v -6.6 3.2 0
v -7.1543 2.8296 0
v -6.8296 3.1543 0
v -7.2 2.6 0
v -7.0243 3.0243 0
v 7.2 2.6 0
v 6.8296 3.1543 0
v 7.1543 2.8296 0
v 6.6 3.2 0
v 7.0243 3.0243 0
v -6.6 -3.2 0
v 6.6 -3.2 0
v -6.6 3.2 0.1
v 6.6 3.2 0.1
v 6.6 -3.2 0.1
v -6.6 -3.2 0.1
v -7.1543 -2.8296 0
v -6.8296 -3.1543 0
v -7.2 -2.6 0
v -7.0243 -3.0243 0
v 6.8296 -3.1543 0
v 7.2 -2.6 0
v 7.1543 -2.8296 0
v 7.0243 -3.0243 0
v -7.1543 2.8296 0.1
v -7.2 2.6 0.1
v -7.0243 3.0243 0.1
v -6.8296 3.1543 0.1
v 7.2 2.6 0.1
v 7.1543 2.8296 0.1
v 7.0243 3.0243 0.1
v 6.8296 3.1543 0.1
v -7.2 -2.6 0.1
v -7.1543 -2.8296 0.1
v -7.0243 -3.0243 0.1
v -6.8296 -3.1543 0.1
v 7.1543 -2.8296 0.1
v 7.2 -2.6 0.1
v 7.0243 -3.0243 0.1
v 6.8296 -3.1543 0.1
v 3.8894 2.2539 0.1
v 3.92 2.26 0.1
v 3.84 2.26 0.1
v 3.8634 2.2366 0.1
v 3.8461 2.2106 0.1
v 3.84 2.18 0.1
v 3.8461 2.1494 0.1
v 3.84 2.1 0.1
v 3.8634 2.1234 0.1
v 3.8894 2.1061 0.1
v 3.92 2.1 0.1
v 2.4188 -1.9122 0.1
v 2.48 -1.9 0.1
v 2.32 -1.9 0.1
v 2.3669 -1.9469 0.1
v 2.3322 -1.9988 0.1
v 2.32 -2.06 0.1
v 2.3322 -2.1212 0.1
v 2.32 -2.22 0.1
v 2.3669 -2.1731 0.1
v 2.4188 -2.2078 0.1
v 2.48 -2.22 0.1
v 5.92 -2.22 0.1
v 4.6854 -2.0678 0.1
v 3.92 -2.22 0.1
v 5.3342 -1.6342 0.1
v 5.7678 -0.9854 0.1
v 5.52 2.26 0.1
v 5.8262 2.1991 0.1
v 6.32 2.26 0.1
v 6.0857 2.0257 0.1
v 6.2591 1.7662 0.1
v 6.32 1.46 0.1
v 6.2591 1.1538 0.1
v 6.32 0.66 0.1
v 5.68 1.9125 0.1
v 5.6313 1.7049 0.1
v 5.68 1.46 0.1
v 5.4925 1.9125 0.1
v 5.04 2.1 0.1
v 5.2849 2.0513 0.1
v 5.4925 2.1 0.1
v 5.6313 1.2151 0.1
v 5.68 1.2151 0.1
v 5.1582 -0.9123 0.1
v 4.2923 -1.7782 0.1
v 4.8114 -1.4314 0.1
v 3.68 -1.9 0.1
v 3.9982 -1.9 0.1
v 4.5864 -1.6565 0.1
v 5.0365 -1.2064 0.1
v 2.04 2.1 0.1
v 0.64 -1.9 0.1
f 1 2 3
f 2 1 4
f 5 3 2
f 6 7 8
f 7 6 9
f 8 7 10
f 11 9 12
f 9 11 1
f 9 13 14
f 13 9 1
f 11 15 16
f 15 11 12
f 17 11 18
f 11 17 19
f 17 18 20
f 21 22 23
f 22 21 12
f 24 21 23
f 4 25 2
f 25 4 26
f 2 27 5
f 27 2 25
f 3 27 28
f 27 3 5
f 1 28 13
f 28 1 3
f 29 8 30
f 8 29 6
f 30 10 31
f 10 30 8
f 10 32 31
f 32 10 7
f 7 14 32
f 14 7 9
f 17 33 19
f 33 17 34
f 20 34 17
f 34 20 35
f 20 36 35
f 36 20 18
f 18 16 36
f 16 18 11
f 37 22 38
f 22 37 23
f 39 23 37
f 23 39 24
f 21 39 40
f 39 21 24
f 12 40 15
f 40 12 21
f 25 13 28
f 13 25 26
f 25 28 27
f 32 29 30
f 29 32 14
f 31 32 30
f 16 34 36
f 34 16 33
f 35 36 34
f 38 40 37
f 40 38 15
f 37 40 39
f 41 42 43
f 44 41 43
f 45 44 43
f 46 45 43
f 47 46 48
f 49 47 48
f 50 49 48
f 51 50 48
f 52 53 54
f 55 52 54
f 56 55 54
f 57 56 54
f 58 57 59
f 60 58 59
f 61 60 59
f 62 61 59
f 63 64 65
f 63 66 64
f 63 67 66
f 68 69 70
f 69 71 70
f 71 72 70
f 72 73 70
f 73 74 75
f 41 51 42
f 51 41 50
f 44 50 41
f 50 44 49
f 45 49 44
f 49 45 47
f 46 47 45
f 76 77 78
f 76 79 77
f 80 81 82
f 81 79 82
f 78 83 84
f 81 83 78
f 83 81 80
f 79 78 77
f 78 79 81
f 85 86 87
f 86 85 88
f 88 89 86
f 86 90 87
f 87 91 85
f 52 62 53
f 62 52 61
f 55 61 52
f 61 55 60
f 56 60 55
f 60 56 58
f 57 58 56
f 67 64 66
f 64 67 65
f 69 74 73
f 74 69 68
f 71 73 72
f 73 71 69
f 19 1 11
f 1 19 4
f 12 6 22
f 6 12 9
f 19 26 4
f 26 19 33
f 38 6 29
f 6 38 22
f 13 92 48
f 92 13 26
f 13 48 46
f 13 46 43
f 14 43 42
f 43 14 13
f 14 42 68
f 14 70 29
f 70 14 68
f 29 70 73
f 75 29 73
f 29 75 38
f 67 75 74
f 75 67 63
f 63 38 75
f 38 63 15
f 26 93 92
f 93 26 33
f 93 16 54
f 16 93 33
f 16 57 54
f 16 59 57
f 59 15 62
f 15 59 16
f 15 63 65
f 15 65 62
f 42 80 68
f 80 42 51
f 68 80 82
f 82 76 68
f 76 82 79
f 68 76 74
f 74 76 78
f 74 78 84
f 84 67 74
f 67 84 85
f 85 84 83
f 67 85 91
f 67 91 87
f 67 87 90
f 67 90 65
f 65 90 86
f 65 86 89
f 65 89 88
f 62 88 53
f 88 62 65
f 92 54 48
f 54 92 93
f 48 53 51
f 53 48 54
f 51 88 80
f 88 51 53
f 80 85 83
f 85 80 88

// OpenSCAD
// file: ../p/box3u12.scad
use <../lib.scad>
function ldraw_lib__box3u12() = [
// 0 Box with 3 Parallel Faces without Any Edges
// 0 Name: box3u12.dat
// 0 Author: J.C. Tchang [tchang]
// 0 !LDRAW_ORG Primitive UPDATE 2014-02
// 0 !LICENSE Licensed under CC BY 4.0 : see CAreadme.txt
// 
// 0 BFC CERTIFY CCW
  [0,"BFC","CERTIFY"],
  [0,"BFC","CCW"],
// 
// 0 !HISTORY 2014-12-23 [PTadmin] Official Update 2014-02
// 
// 
// 4 16 -1 1 1 1 1 1 1 1 -1 -1 1 -1
  [4,16,-1,1,1,1,1,1,1,1,-1,-1,1,-1],
// 4 16 -1 1 1 -1 0 1 1 0 1 1 1 1
  [4,16,-1,1,1,-1,0,1,1,0,1,1,1,1],
// 4 16 1 1 -1 1 0 -1 -1 0 -1 -1 1 -1
  [4,16,1,1,-1,1,0,-1,-1,0,-1,-1,1,-1],
];
module ldraw_lib__box3u12(step=0, col=false, unit=2/5, alt=false, line=0.2, solid=!$preview)
    makepoly(ldraw_lib__box3u12(), step=step, col=col, unit=unit, alt=alt, line=line, solid=solid);
ldraw_lib__box3u12(line=0.2);
// file: ../p/5-16ndis.scad
use <../lib.scad>
function ldraw_lib__5_16ndis() = [
// 0 Disc Negative 0.3125
// 0 Name: 5-16ndis.dat
// 0 Author: Max Martin Richter [MMR1988]
// 0 !LDRAW_ORG Primitive UPDATE 2013-01
// 0 !LICENSE Licensed under CC BY 4.0 : see CAreadme.txt
// 
// 0 BFC CERTIFY CCW
  [0,"BFC","CERTIFY"],
  [0,"BFC","CCW"],
// 
// 0 !HISTORY 2013-07-21 [PTadmin] Official Update 2013-01
// 
// 
// 3 16 1 0 1 0.9239 0 0.3827 1 0 0
  [3,16,1,0,1,0.9239,0,0.3827,1,0,0],
// 3 16 1 0 1 0.7071 0 0.7071 0.9239 0 0.3827
  [3,16,1,0,1,0.7071,0,0.7071,0.9239,0,0.3827],
// 3 16 1 0 1 0.3827 0 0.9239 0.7071 0 0.7071
  [3,16,1,0,1,0.3827,0,0.9239,0.7071,0,0.7071],
// 3 16 1 0 1 0 0 1 0.3827 0 0.9239
  [3,16,1,0,1,0,0,1,0.3827,0,0.9239],
// 3 16 -1 0 1 -0.3827 0 0.9239 0 0 1
  [3,16,-1,0,1,-0.3827,0,0.9239,0,0,1],
// 0 // Build by Primitive Generator 2
];
module ldraw_lib__5_16ndis(step=0, col=false, unit=2/5, alt=false, line=0.2, solid=!$preview)
    makepoly(ldraw_lib__5_16ndis(), step=step, col=col, unit=unit, alt=alt, line=line, solid=solid);
ldraw_lib__5_16ndis(line=0.2);
// file: ../p/5-16chrd.scad
use <../lib.scad>
function ldraw_lib__5_16chrd() = [
// 0 Chord 0.3125
// 0 Name: 5-16chrd.dat
// 0 Author: Niels Karsdorp [nielsk]
// 0 !LDRAW_ORG Primitive UPDATE 2010-01
// 0 !LICENSE Licensed under CC BY 4.0 : see CAreadme.txt
// 
// 0 BFC CERTIFY CCW
  [0,"BFC","CERTIFY"],
  [0,"BFC","CCW"],
// 
// 0 !HISTORY 2010-04-05 [PTadmin] Official Update 2010-01
// 
// 
// 4 16 1 0 0 0.9239 0 0.3827 0 0 1 -0.3827 0 0.9239
  [4,16,1,0,0,0.9239,0,0.3827,0,0,1,-0.3827,0,0.9239],
// 4 16 0.9239 0 0.3827 0.7071 0 0.7071 0.3827 0 0.9239 0 0 1
  [4,16,0.9239,0,0.3827,0.7071,0,0.7071,0.3827,0,0.9239,0,0,1],
// 0
// 
];
module ldraw_lib__5_16chrd(step=0, col=false, unit=2/5, alt=false, line=0.2, solid=!$preview)
    makepoly(ldraw_lib__5_16chrd(), step=step, col=col, unit=unit, alt=alt, line=line, solid=solid);
ldraw_lib__5_16chrd(line=0.2);
// file: ../p/3-16tang.scad
use <../lib.scad>
function ldraw_lib__3_16tang() = [
// 0 Disc Negative Tangent 0.1875
// 0 Name: 3-16tang.dat
// 0 Author: Massimo Maso [Sirio]
// 0 !LDRAW_ORG Primitive UPDATE 2022-03
// 0 !LICENSE Licensed under CC BY 4.0 : see CAreadme.txt
// 
// 0 BFC CERTIFY CCW
  [0,"BFC","CERTIFY"],
  [0,"BFC","CCW"],
// 
// 0 !HISTORY 2022-05-07 [PTadmin] Official Update 2022-03
// 
// 
// 3 16 1 0 0 1 0 0.1989 0.9239 0 0.3827
  [3,16,1,0,0,1,0,0.1989,0.9239,0,0.3827],
// 3 16 0.9239 0 0.3827 0.8478 0 0.5665 0.7071 0 0.7071
  [3,16,0.9239,0,0.3827,0.8478,0,0.5665,0.7071,0,0.7071],
// 3 16 0.7071 0 0.7071 0.5665 0 0.8478 0.3827 0 0.9239
  [3,16,0.7071,0,0.7071,0.5665,0,0.8478,0.3827,0,0.9239],
];
module ldraw_lib__3_16tang(step=0, col=false, unit=2/5, alt=false, line=0.2, solid=!$preview)
    makepoly(ldraw_lib__3_16tang(), step=step, col=col, unit=unit, alt=alt, line=line, solid=solid);
ldraw_lib__3_16tang(line=0.2);
// file: ../p/3-16ndis.scad
use <../lib.scad>
function ldraw_lib__3_16ndis() = [
// 0 Disc Negative 0.1875
// 0 Name: 3-16ndis.dat
// 0 Author: Magnus Forsberg [MagFors]
// 0 !LDRAW_ORG Primitive UPDATE 2024-01
// 0 !LICENSE Licensed under CC BY 4.0 : see CAreadme.txt
// 
// 0 BFC CERTIFY CCW
  [0,"BFC","CERTIFY"],
  [0,"BFC","CCW"],
// 
// 0 !HISTORY 2009-05-02 [PTadmin] Official Update 2009-01
// 0 !HISTORY 2024-01-03 [MagFors] Complete regeneration, original by guyvivan
// 0 !HISTORY 2024-01-29 [OrionP] Official Update 2024-01
// 
// 3 16 1 0 1 0.9239 0 0.3827 1 0 0
  [3,16,1,0,1,0.9239,0,0.3827,1,0,0],
// 3 16 1 0 1 0.7071 0 0.7071 0.9239 0 0.3827
  [3,16,1,0,1,0.7071,0,0.7071,0.9239,0,0.3827],
// 3 16 1 0 1 0.3827 0 0.9239 0.7071 0 0.7071
  [3,16,1,0,1,0.3827,0,0.9239,0.7071,0,0.7071],
// 0 // Build by LDPartEditor (PrimGen 2.X)
];
module ldraw_lib__3_16ndis(step=0, col=false, unit=2/5, alt=false, line=0.2, solid=!$preview)
    makepoly(ldraw_lib__3_16ndis(), step=step, col=col, unit=unit, alt=alt, line=line, solid=solid);
ldraw_lib__3_16ndis(line=0.2);
// file: ../p/3-16chrd.scad
use <../lib.scad>
function ldraw_lib__3_16chrd() = [
// 0 Chord 0.1875
// 0 Name: 3-16chrd.dat
// 0 Author: Niels Karsdorp [nielsk]
// 0 !LDRAW_ORG Primitive UPDATE 2009-01
// 0 !LICENSE Licensed under CC BY 4.0 : see CAreadme.txt
// 
// 0 BFC CERTIFY CCW
  [0,"BFC","CERTIFY"],
  [0,"BFC","CCW"],
// 
// 0 !HISTORY 2009-05-02 [PTadmin] Official Update 2009-01
// 
// 
// 4 16 1 0 0 0.9239 0 0.3827 0.7071 0 0.7071 0.3827 0 0.9239
  [4,16,1,0,0,0.9239,0,0.3827,0.7071,0,0.7071,0.3827,0,0.9239],
// 0
// 
];
module ldraw_lib__3_16chrd(step=0, col=false, unit=2/5, alt=false, line=0.2, solid=!$preview)
    makepoly(ldraw_lib__3_16chrd(), step=step, col=col, unit=unit, alt=alt, line=line, solid=solid);
ldraw_lib__3_16chrd(line=0.2);
// file: ../p/2-4ndis.scad
use <../lib.scad>
function ldraw_lib__2_4ndis() = [
// 0 Disc Negative 0.5
// 0 Name: 2-4ndis.dat
// 0 Author: James Jessiman
// 0 !LDRAW_ORG Primitive UPDATE 2012-01
// 0 !LICENSE Licensed under CC BY 4.0 : see CAreadme.txt
// 
// 0 BFC CERTIFY CCW
  [0,"BFC","CERTIFY"],
  [0,"BFC","CCW"],
// 
// 0 !HISTORY 2002-03-23 [sbliss] Added BFC statement; compacted code
// 0 !HISTORY 2002-04-25 [PTadmin] Official Update 2002-02
// 0 !HISTORY 2007-06-24 [PTadmin] Header formatted for Contributor Agreement
// 0 !HISTORY 2008-07-01 [PTadmin] Official Update 2008-01
// 0 !HISTORY 2012-02-16 [Philo] Changed to CCW
// 0 !HISTORY 2012-03-30 [PTadmin] Official Update 2012-01
// 
// 
// 3 16 0.9239 0 0.3827 1 0 0 1 0 1
  [3,16,0.9239,0,0.3827,1,0,0,1,0,1],
// 3 16 0.7071 0 0.7071 0.9239 0 0.3827 1 0 1
  [3,16,0.7071,0,0.7071,0.9239,0,0.3827,1,0,1],
// 3 16 0.3827 0 0.9239 0.7071 0 0.7071 1 0 1
  [3,16,0.3827,0,0.9239,0.7071,0,0.7071,1,0,1],
// 3 16 0 0 1 0.3827 0 0.9239 1 0 1
  [3,16,0,0,1,0.3827,0,0.9239,1,0,1],
// 3 16 -0.3827 0 0.9239 0 0 1 -1 0 1
  [3,16,-0.3827,0,0.9239,0,0,1,-1,0,1],
// 3 16 -0.7071 0 0.7071 -0.3827 0 0.9239 -1 0 1
  [3,16,-0.7071,0,0.7071,-0.3827,0,0.9239,-1,0,1],
// 3 16 -0.9239 0 0.3827 -0.7071 0 0.7071 -1 0 1
  [3,16,-0.9239,0,0.3827,-0.7071,0,0.7071,-1,0,1],
// 3 16 -1 0 0 -0.9239 0 0.3827 -1 0 1
  [3,16,-1,0,0,-0.9239,0,0.3827,-1,0,1],
];
module ldraw_lib__2_4ndis(step=0, col=false, unit=2/5, alt=false, line=0.2, solid=!$preview)
    makepoly(ldraw_lib__2_4ndis(), step=step, col=col, unit=unit, alt=alt, line=line, solid=solid);
ldraw_lib__2_4ndis(line=0.2);
// file: ../p/2-4chrd.scad
use <../lib.scad>
function ldraw_lib__2_4chrd() = [
// 0 Chord 0.5
// 0 Name: 2-4chrd.dat
// 0 Author: Philippe Hurbain [Philo]
// 0 !LDRAW_ORG Primitive UPDATE 2014-01
// 0 !LICENSE Licensed under CC BY 4.0 : see CAreadme.txt
// 
// 0 BFC CERTIFY CCW
  [0,"BFC","CERTIFY"],
  [0,"BFC","CCW"],
// 
// 0 !HISTORY 2014-06-21 [PTadmin] Official Update 2014-01
// 
// 
// 4 16 0.9239 0 0.3827 -0.9239 0 0.3827 -1 0 0 1 0 0
  [4,16,0.9239,0,0.3827,-0.9239,0,0.3827,-1,0,0,1,0,0],
// 4 16 0.7071 0 0.7071 -0.7071 0 0.7071 -0.9239 0 0.3827 0.9239 0 0.3827
  [4,16,0.7071,0,0.7071,-0.7071,0,0.7071,-0.9239,0,0.3827,0.9239,0,0.3827],
// 4 16 0.3827 0 0.9239 -0.3827 0 0.9239 -0.7071 0 0.7071 0.7071 0 0.7071
  [4,16,0.3827,0,0.9239,-0.3827,0,0.9239,-0.7071,0,0.7071,0.7071,0,0.7071],
// 3 16 0 0 1 -0.3827 0 0.9239 0.3827 0 0.9239
  [3,16,0,0,1,-0.3827,0,0.9239,0.3827,0,0.9239],
];
module ldraw_lib__2_4chrd(step=0, col=false, unit=2/5, alt=false, line=0.2, solid=!$preview)
    makepoly(ldraw_lib__2_4chrd(), step=step, col=col, unit=unit, alt=alt, line=line, solid=solid);
ldraw_lib__2_4chrd(line=0.2);
// file: ../p/1-8tndis.scad
use <../lib.scad>
function ldraw_lib__1_8tndis() = [
// 0 Disc Negative Truncated 0.125
// 0 Name: 1-8tndis.dat
// 0 Author: Massimo Maso [Sirio]
// 0 !LDRAW_ORG Primitive UPDATE 2022-02
// 0 !LICENSE Licensed under CC BY 4.0 : see CAreadme.txt
// 
// 0 BFC CERTIFY CCW
  [0,"BFC","CERTIFY"],
  [0,"BFC","CCW"],
// 
// 0 !HISTORY 2022-03-06 [PTadmin] Official Update 2022-02
// 
// 
// 3 16 1 0 .7071 .9239 0 .3827 1 0 0
  [3,16,1,0,.7071,.9239,0,.3827,1,0,0],
// 3 16 1 0 .7071 .7071 0 .7071 .9239 0 .3827
  [3,16,1,0,.7071,.7071,0,.7071,.9239,0,.3827],
];
module ldraw_lib__1_8tndis(step=0, col=false, unit=2/5, alt=false, line=0.2, solid=!$preview)
    makepoly(ldraw_lib__1_8tndis(), step=step, col=col, unit=unit, alt=alt, line=line, solid=solid);
ldraw_lib__1_8tndis(line=0.2);
// file: ../p/1-4cyli.scad
use <../lib.scad>
function ldraw_lib__1_4cyli() = [
// 0 Cylinder 0.25
// 0 Name: 1-4cyli.dat
// 0 Author: James Jessiman
// 0 !LDRAW_ORG Primitive UPDATE 2012-01
// 0 !LICENSE Licensed under CC BY 4.0 : see CAreadme.txt
// 
// 0 BFC CERTIFY CCW
  [0,"BFC","CERTIFY"],
  [0,"BFC","CCW"],
// 
// 0 !HISTORY 2002-03-23 [sbliss] Added BFC statement.
// 0 !HISTORY 2002-04-25 [PTadmin] Official Update 2002-02
// 0 !HISTORY 2007-06-22 [PTadmin] Header formatted for Contributor Agreement
// 0 !HISTORY 2008-07-01 [PTadmin] Official Update 2008-01
// 0 !HISTORY 2012-02-16 [Philo] Changed to CCW
// 0 !HISTORY 2012-03-30 [PTadmin] Official Update 2012-01
// 
// 
// 4 16 1 1 0 0.9239 1 0.3827 0.9239 0 0.3827 1 0 0
  [4,16,1,1,0,0.9239,1,0.3827,0.9239,0,0.3827,1,0,0],
// 5 24 1 0 0 1 1 0 0.9239 0 0.3827 1 0 -1
  [5,24,1,0,0,1,1,0,0.9239,0,0.3827,1,0,-1],
// 4 16 0.9239 1 0.3827 0.7071 1 0.7071 0.7071 0 0.7071 0.9239 0 0.3827
  [4,16,0.9239,1,0.3827,0.7071,1,0.7071,0.7071,0,0.7071,0.9239,0,0.3827],
// 5 24 0.9239 0 0.3827 0.9239 1 0.3827 0.7071 0 0.7071 1 0 0
  [5,24,0.9239,0,0.3827,0.9239,1,0.3827,0.7071,0,0.7071,1,0,0],
// 4 16 0.7071 1 0.7071 0.3827 1 0.9239 0.3827 0 0.9239 0.7071 0 0.7071
  [4,16,0.7071,1,0.7071,0.3827,1,0.9239,0.3827,0,0.9239,0.7071,0,0.7071],
// 5 24 0.7071 0 0.7071 0.7071 1 0.7071 0.3827 0 0.9239 0.9239 0 0.3827
  [5,24,0.7071,0,0.7071,0.7071,1,0.7071,0.3827,0,0.9239,0.9239,0,0.3827],
// 4 16 0.3827 1 0.9239 0 1 1 0 0 1 0.3827 0 0.9239
  [4,16,0.3827,1,0.9239,0,1,1,0,0,1,0.3827,0,0.9239],
// 5 24 0.3827 0 0.9239 0.3827 1 0.9239 0 0 1 0.7071 0 0.7071
  [5,24,0.3827,0,0.9239,0.3827,1,0.9239,0,0,1,0.7071,0,0.7071],
// 5 24 0 0 1 0 1 1 0.3827 0 0.9239 -1 0 1
  [5,24,0,0,1,0,1,1,0.3827,0,0.9239,-1,0,1],
];
module ldraw_lib__1_4cyli(step=0, col=false, unit=2/5, alt=false, line=0.2, solid=!$preview)
    makepoly(ldraw_lib__1_4cyli(), step=step, col=col, unit=unit, alt=alt, line=line, solid=solid);
ldraw_lib__1_4cyli(line=0.2);
// file: ../p/1-4chrd.scad
use <../lib.scad>
function ldraw_lib__1_4chrd() = [
// 0 Chord 0.25
// 0 Name: 1-4chrd.dat
// 0 Author: Max Martin Richter [MMR1988]
// 0 !LDRAW_ORG Primitive UPDATE 2023-05
// 0 !LICENSE Licensed under CC BY 4.0 : see CAreadme.txt
// 
// 0 BFC CERTIFY CCW
  [0,"BFC","CERTIFY"],
  [0,"BFC","CCW"],
// 
// 0 !HISTORY 2004-04-22 [PTadmin] Official Update 2004-02
// 0 !HISTORY 2007-10-09 [PTadmin] Header formatted for Contributor Agreement
// 0 !HISTORY 2008-07-01 [PTadmin] Official Update 2008-01
// 0 !HISTORY 2012-08-02 [MMR1988] Re-creation with PrimGen2 and Rectifier
// 0 !HISTORY 2012-08-09 [PTadmin] Official Update 2012-02
// 0 !HISTORY 2023-10-27 [OrionP] Change author to MMR1988 from hafhead
// 0 !HISTORY 2023-10-31 [OrionP] Official Update 2023-05
// 
// 4 16 0.9239 0 0.3827 0.3827 0 0.9239 0 0 1 1 0 0
  [4,16,0.9239,0,0.3827,0.3827,0,0.9239,0,0,1,1,0,0],
// 3 16 0.7071 0 0.7071 0.3827 0 0.9239 0.9239 0 0.3827
  [3,16,0.7071,0,0.7071,0.3827,0,0.9239,0.9239,0,0.3827],
];
module ldraw_lib__1_4chrd(step=0, col=false, unit=2/5, alt=false, line=0.2, solid=!$preview)
    makepoly(ldraw_lib__1_4chrd(), step=step, col=col, unit=unit, alt=alt, line=line, solid=solid);
ldraw_lib__1_4chrd(line=0.2);
// file: ../p/1-16tndis.scad
use <../lib.scad>
function ldraw_lib__1_16tndis() = [
// 0 Disc Negative Truncated 0.0625
// 0 Name: 1-16tndis.dat
// 0 Author: Massimo Maso [Sirio]
// 0 !LDRAW_ORG Primitive UPDATE 2022-03
// 0 !LICENSE Licensed under CC BY 4.0 : see CAreadme.txt
// 
// 0 BFC CERTIFY CCW
  [0,"BFC","CERTIFY"],
  [0,"BFC","CCW"],
// 
// 0 !HISTORY 2022-05-07 [PTadmin] Official Update 2022-03
// 
// 
// 3 16 1 0 .3827 .9239 0 .3827 1 0 0
  [3,16,1,0,.3827,.9239,0,.3827,1,0,0],
];
module ldraw_lib__1_16tndis(step=0, col=false, unit=2/5, alt=false, line=0.2, solid=!$preview)
    makepoly(ldraw_lib__1_16tndis(), step=step, col=col, unit=unit, alt=alt, line=line, solid=solid);
ldraw_lib__1_16tndis(line=0.2);
// main file
use <../lib.scad>
use <../p/1-16tndis.scad>
use <../p/1-4chrd.scad>
use <../p/1-4cyli.scad>
use <../p/1-8tndis.scad>
use <../p/2-4chrd.scad>
use <../p/2-4ndis.scad>
use <../p/3-16chrd.scad>
use <../p/3-16ndis.scad>
use <../p/3-16tang.scad>
use <../p/5-16chrd.scad>
use <../p/5-16ndis.scad>
use <../p/box3u12.scad>
function ldraw_lib__6177741h() = [
// 0 Sticker  0.8 x  1.8 with Black Air Scope on Transparent Background
// 0 Name: 6177741h.dat
// 0 Author: Massimo Maso [Sirio]
// 0 !LDRAW_ORG Part UPDATE 2025-05
// 0 !LICENSE Licensed under CC BY 4.0 : see CAreadme.txt
// 
// 0 !HELP Needs work: halftone areas are simplified because no high-resolution images are available
// 
// 0 BFC CERTIFY CCW
  [0,"BFC","CERTIFY"],
  [0,"BFC","CCW"],
// 
// 0 !KEYWORDS AMG, BrickLink 75877stk01, GT3, Mercedes, Rebrickable 30844
// 0 !KEYWORDS Set 75877, Speed Champions
// 
// 0 !HISTORY 2025-05-28 [OrionP] Official Update 2025-05
// 
// 0 // Primitives
// 1 16 -16.5 0 6.5 -1.5 0 0 0 -1 0 0 0 1.5 1-4chrd.dat
  [1,16,-16.5,0,6.5,-1.5,0,0,0,-1,0,0,0,1.5, ldraw_lib__1_4chrd()],
// 1 16 16.5 0 6.5 1.5 0 0 0 -1 0 0 0 1.5 1-4chrd.dat
  [1,16,16.5,0,6.5,1.5,0,0,0,-1,0,0,0,1.5, ldraw_lib__1_4chrd()],
// 1 16 0 -.25 0 16.5 0 0 0 .25 0 0 0 8 box3u12.dat
  [1,16,0,-.25,0,16.5,0,0,0,.25,0,0,0,8, ldraw_lib__box3u12()],
// 1 16 -16.5 0 -6.5 -1.5 0 0 0 -1 0 0 0 -1.5 1-4chrd.dat
  [1,16,-16.5,0,-6.5,-1.5,0,0,0,-1,0,0,0,-1.5, ldraw_lib__1_4chrd()],
// 1 16 16.5 0 -6.5 1.5 0 0 0 -1 0 0 0 -1.5 1-4chrd.dat
  [1,16,16.5,0,-6.5,1.5,0,0,0,-1,0,0,0,-1.5, ldraw_lib__1_4chrd()],
// 1 16 -16.5 0 6.5 -1.5 0 0 0 -.25 0 0 0 1.5 1-4cyli.dat
  [1,16,-16.5,0,6.5,-1.5,0,0,0,-.25,0,0,0,1.5, ldraw_lib__1_4cyli()],
// 1 16 16.5 0 6.5 1.5 0 0 0 -.25 0 0 0 1.5 1-4cyli.dat
  [1,16,16.5,0,6.5,1.5,0,0,0,-.25,0,0,0,1.5, ldraw_lib__1_4cyli()],
// 1 16 -16.5 0 -6.5 -1.5 0 0 0 -.25 0 0 0 -1.5 1-4cyli.dat
  [1,16,-16.5,0,-6.5,-1.5,0,0,0,-.25,0,0,0,-1.5, ldraw_lib__1_4cyli()],
// 1 16 16.5 0 -6.5 1.5 0 0 0 -.25 0 0 0 -1.5 1-4cyli.dat
  [1,16,16.5,0,-6.5,1.5,0,0,0,-.25,0,0,0,-1.5, ldraw_lib__1_4cyli()],
// 1 16 -16.5 -.25 6.5 -1.5 0 0 0 1 0 0 0 1.5 1-4chrd.dat
  [1,16,-16.5,-.25,6.5,-1.5,0,0,0,1,0,0,0,1.5, ldraw_lib__1_4chrd()],
// 1 16 16.5 -.25 6.5 1.5 0 0 0 1 0 0 0 1.5 1-4chrd.dat
  [1,16,16.5,-.25,6.5,1.5,0,0,0,1,0,0,0,1.5, ldraw_lib__1_4chrd()],
// 1 16 -16.5 -.25 -6.5 -1.5 0 0 0 1 0 0 0 -1.5 1-4chrd.dat
  [1,16,-16.5,-.25,-6.5,-1.5,0,0,0,1,0,0,0,-1.5, ldraw_lib__1_4chrd()],
// 1 16 16.5 -.25 -6.5 1.5 0 0 0 1 0 0 0 -1.5 1-4chrd.dat
  [1,16,16.5,-.25,-6.5,1.5,0,0,0,1,0,0,0,-1.5, ldraw_lib__1_4chrd()],
// 1 16 9.8 -.25 5.45 0 0 -.2 0 1 0 .2 0 0 2-4ndis.dat
  [1,16,9.8,-.25,5.45,0,0,-.2,0,1,0,.2,0,0, ldraw_lib__2_4ndis()],
// 1 16 6.2 -.25 -5.15 0 0 -.4 0 1 0 .4 0 0 2-4ndis.dat
  [1,16,6.2,-.25,-5.15,0,0,-.4,0,1,0,.4,0,0, ldraw_lib__2_4ndis()],
// 1 16 9.8 -.25 -.55 0 0 5 0 1 0 -5 0 0 3-16ndis.dat
  [1,16,9.8,-.25,-.55,0,0,5,0,1,0,-5,0,0, ldraw_lib__3_16ndis()],
// 1 16 13.8 -.25 3.65 0 0 2 0 1 0 2 0 0 5-16ndis.dat
  [1,16,13.8,-.25,3.65,0,0,2,0,1,0,2,0,0, ldraw_lib__5_16ndis()],
// 0 BFC NOCLIP
  [0,"BFC","NOCLIP"],
// 1 0 9.8 -.25 5.45 0 0 -.2 0 1 0 .2 0 0 2-4chrd.dat
  [1,0,9.8,-.25,5.45,0,0,-.2,0,1,0,.2,0,0, ldraw_lib__2_4chrd()],
// 1 0 12.6 -.25 3.65 1.6 0 0 0 1 0 0 0 1.6 1-8tndis.dat
  [1,0,12.6,-.25,3.65,1.6,0,0,0,1,0,0,0,1.6, ldraw_lib__1_8tndis()],
// 1 0 12.6 -.25 3.65 0 0 1.6 0 1 0 1.6 0 0 1-8tndis.dat
  [1,0,12.6,-.25,3.65,0,0,1.6,0,1,0,1.6,0,0, ldraw_lib__1_8tndis()],
// 1 0 12.6 -.25 3.65 1.6 0 0 0 1 0 0 0 -1.6 1-16tndis.dat
  [1,0,12.6,-.25,3.65,1.6,0,0,0,1,0,0,0,-1.6, ldraw_lib__1_16tndis()],
// 1 72 12.6 -.25 3.65 0 0 1.6 0 1 0 1.6 0 0 5-16chrd.dat
  [1,72,12.6,-.25,3.65,0,0,1.6,0,1,0,1.6,0,0, ldraw_lib__5_16chrd()],
// 1 72 9.2 -.25 -.75 0 0 4 0 1 0 -4 0 0 3-16chrd.dat
  [1,72,9.2,-.25,-.75,0,0,4,0,1,0,-4,0,0, ldraw_lib__3_16chrd()],
// 1 0 9.2 -.25 -.75 0 0 4 0 1 0 -4 0 0 3-16tang.dat
  [1,0,9.2,-.25,-.75,0,0,4,0,1,0,-4,0,0, ldraw_lib__3_16tang()],
// 1 0 6.2 -.25 -5.15 0 0 -.4 0 1 0 .4 0 0 2-4chrd.dat
  [1,0,6.2,-.25,-5.15,0,0,-.4,0,1,0,.4,0,0, ldraw_lib__2_4chrd()],
// 1 0 9.8 -.25 -.55 0 0 5 0 1 0 -5 0 0 3-16chrd.dat
  [1,0,9.8,-.25,-.55,0,0,5,0,1,0,-5,0,0, ldraw_lib__3_16chrd()],
// 1 0 13.8 -.25 3.65 0 0 2 0 1 0 2 0 0 5-16chrd.dat
  [1,0,13.8,-.25,3.65,0,0,2,0,1,0,2,0,0, ldraw_lib__5_16chrd()],
// 0 BFC CLIP
  [0,"BFC","CLIP"],
// 0 // Bottom faces
// 4 16 -16.5 0 8 -16.5 0 -8 -18 0 -6.5 -18 0 6.5
  [4,16,-16.5,0,8,-16.5,0,-8,-18,0,-6.5,-18,0,6.5],
// 4 16 16.5 0 8 18 0 6.5 18 0 -6.5 16.5 0 -8
  [4,16,16.5,0,8,18,0,6.5,18,0,-6.5,16.5,0,-8],
// 0 // Lateral faces
// 4 16 -18 0 6.5 -18 0 -6.5 -18 -.25 -6.5 -18 -.25 6.5
  [4,16,-18,0,6.5,-18,0,-6.5,-18,-.25,-6.5,-18,-.25,6.5],
// 4 16 18 0 6.5 18 -.25 6.5 18 -.25 -6.5 18 0 -6.5
  [4,16,18,0,6.5,18,-.25,6.5,18,-.25,-6.5,18,0,-6.5],
// 0 // Top faces
// 0 // Trasparent faces
// 4 16 -16.5 -.25 8 -18 -.25 6.5 5.1 -.25 5.25 9.6 -.25 5.25
  [4,16,-16.5,-.25,8,-18,-.25,6.5,5.1,-.25,5.25,9.6,-.25,5.25],
// 3 16 -16.5 -.25 8 9.6 -.25 5.25 9.6 -.25 5.45
  [3,16,-16.5,-.25,8,9.6,-.25,5.25,9.6,-.25,5.45],
// 3 16 -16.5 -.25 8 9.6 -.25 5.45 9.6 -.25 5.65
  [3,16,-16.5,-.25,8,9.6,-.25,5.45,9.6,-.25,5.65],
// 4 16 -16.5 -.25 8 9.6 -.25 5.65 9.8 -.25 5.65 16.5 -.25 8
  [4,16,-16.5,-.25,8,9.6,-.25,5.65,9.8,-.25,5.65,16.5,-.25,8],
// 3 16 16.5 -.25 8 9.8 -.25 5.65 13.8 -.25 5.65
  [3,16,16.5,-.25,8,9.8,-.25,5.65,13.8,-.25,5.65],
// 4 16 16.5 -.25 8 13.8 -.25 5.65 15.8 -.25 5.65 18 -.25 6.5
  [4,16,16.5,-.25,8,13.8,-.25,5.65,15.8,-.25,5.65,18,-.25,6.5],
// 3 16 18 -.25 6.5 15.8 -.25 5.65 15.8 -.25 3.65
  [3,16,18,-.25,6.5,15.8,-.25,5.65,15.8,-.25,3.65],
// 4 16 18 -.25 6.5 15.8 -.25 3.65 15.8 -.25 1.65 18 -.25 -6.5
  [4,16,18,-.25,6.5,15.8,-.25,3.65,15.8,-.25,1.65,18,-.25,-6.5],
// 4 16 14.8 -.25 -5.55 15.8 -.25 1.65 15.6478 -.25 2.8846 14.4195 -.25 -2.4635
  [4,16,14.8,-.25,-5.55,15.8,-.25,1.65,15.6478,-.25,2.8846,14.4195,-.25,-2.4635],
// 4 16 14.8 -.25 -5.55 16.5 -.25 -8 18 -.25 -6.5 15.8 -.25 1.65
  [4,16,14.8,-.25,-5.55,16.5,-.25,-8,18,-.25,-6.5,15.8,-.25,1.65],
// 4 16 -18 -.25 -6.5 1.6 -.25 -4.75 5.1 -.25 5.25 -18 -.25 6.5
  [4,16,-18,-.25,-6.5,1.6,-.25,-4.75,5.1,-.25,5.25,-18,-.25,6.5],
// 4 16 -18 -.25 -6.5 -16.5 -.25 -8 5.8 -.25 -4.75 1.6 -.25 -4.75
  [4,16,-18,-.25,-6.5,-16.5,-.25,-8,5.8,-.25,-4.75,1.6,-.25,-4.75],
// 3 16 -16.5 -.25 -8 5.8 -.25 -5.15 5.8 -.25 -4.75
  [3,16,-16.5,-.25,-8,5.8,-.25,-5.15,5.8,-.25,-4.75],
// 3 16 -16.5 -.25 -8 5.8 -.25 -5.55 5.8 -.25 -5.15
  [3,16,-16.5,-.25,-8,5.8,-.25,-5.55,5.8,-.25,-5.15],
// 4 16 -16.5 -.25 -8 16.5 -.25 -8 6.2 -.25 -5.55 5.8 -.25 -5.55
  [4,16,-16.5,-.25,-8,16.5,-.25,-8,6.2,-.25,-5.55,5.8,-.25,-5.55],
// 3 16 16.5 -.25 -8 14.8 -.25 -5.55 9.8 -.25 -5.55
  [3,16,16.5,-.25,-8,14.8,-.25,-5.55,9.8,-.25,-5.55],
// 3 16 16.5 -.25 -8 9.8 -.25 -5.55 6.2 -.25 -5.55
  [3,16,16.5,-.25,-8,9.8,-.25,-5.55,6.2,-.25,-5.55],
// 0 BFC NOCLIP
  [0,"BFC","NOCLIP"],
// 0 // Black frame faces
// 4 0 13.8 -.25 5.65 9.8 -.25 5.65 9.8 -.25 5.25 12.6 -.25 5.25
  [4,0,13.8,-.25,5.65,9.8,-.25,5.65,9.8,-.25,5.25,12.6,-.25,5.25],
// 3 0 13.8 -.25 5.65 12.6 -.25 5.25 13.73136 -.25 5.25
  [3,0,13.8,-.25,5.65,12.6,-.25,5.25,13.73136,-.25,5.25],
// 4 0 13.8 -.25 5.65 13.73136 -.25 5.25 13.73136 -.25 4.78136 14.2 -.25 4.78136
  [4,0,13.8,-.25,5.65,13.73136,-.25,5.25,13.73136,-.25,4.78136,14.2,-.25,4.78136],
// 3 0 13.8 -.25 5.65 14.2 -.25 4.78136 15.6478 -.25 2.8846
  [3,0,13.8,-.25,5.65,14.2,-.25,4.78136,15.6478,-.25,2.8846],
// 3 0 15.6478 -.25 2.8846 14.2 -.25 4.78136 14.2 -.25 3.65
  [3,0,15.6478,-.25,2.8846,14.2,-.25,4.78136,14.2,-.25,3.65],
// 3 0 15.6478 -.25 2.8846 14.2 -.25 3.65 14.2 -.25 3.03768
  [3,0,15.6478,-.25,2.8846,14.2,-.25,3.65,14.2,-.25,3.03768],
// 4 0 15.6478 -.25 2.8846 14.2 -.25 3.03768 12.8956 -.25 -2.2808 14.4195 -.25 -2.4635
  [4,0,15.6478,-.25,2.8846,14.2,-.25,3.03768,12.8956,-.25,-2.2808,14.4195,-.25,-2.4635],
// 3 0 12.8956 -.25 -2.2808 14.2 -.25 3.03768 14.07824 -.25 3.03768
  [3,0,12.8956,-.25,-2.2808,14.2,-.25,3.03768,14.07824,-.25,3.03768],
// 3 0 14.4195 -.25 -2.4635 12.8956 -.25 -2.2808 12.5912 -.25 -3.016
  [3,0,14.4195,-.25,-2.4635,12.8956,-.25,-2.2808,12.5912,-.25,-3.016],
// 3 0 14.4195 -.25 -2.4635 12.5912 -.25 -3.016 12.0284 -.25 -3.5784
  [3,0,14.4195,-.25,-2.4635,12.5912,-.25,-3.016,12.0284,-.25,-3.5784],
// 3 0 14.4195 -.25 -2.4635 12.0284 -.25 -3.5784 11.466 -.25 -4.1412
  [3,0,14.4195,-.25,-2.4635,12.0284,-.25,-3.5784,11.466,-.25,-4.1412],
// 3 0 14.4195 -.25 -2.4635 11.466 -.25 -4.1412 9.8 -.25 -5.55
  [3,0,14.4195,-.25,-2.4635,11.466,-.25,-4.1412,9.8,-.25,-5.55],
// 3 0 9.8 -.25 -5.55 11.466 -.25 -4.1412 10.7308 -.25 -4.4456
  [3,0,9.8,-.25,-5.55,11.466,-.25,-4.1412,10.7308,-.25,-4.4456],
// 3 0 9.8 -.25 -5.55 10.7308 -.25 -4.4456 9.9956 -.25 -4.75
  [3,0,9.8,-.25,-5.55,10.7308,-.25,-4.4456,9.9956,-.25,-4.75],
// 3 0 9.8 -.25 -5.55 9.9956 -.25 -4.75 9.2 -.25 -4.75
  [3,0,9.8,-.25,-5.55,9.9956,-.25,-4.75,9.2,-.25,-4.75],
// 4 0 9.8 -.25 -5.55 9.2 -.25 -4.75 6.2 -.25 -4.75 6.2 -.25 -5.55
  [4,0,9.8,-.25,-5.55,9.2,-.25,-4.75,6.2,-.25,-4.75,6.2,-.25,-5.55],
// 0 // Halftone faces (actually 16 ndis and 0 disc)
// 4 71 9.6 -.25 5.25 5.1 -.25 5.25 1.6 -.25 -4.75 5.8 -.25 -4.75
  [4,71,9.6,-.25,5.25,5.1,-.25,5.25,1.6,-.25,-4.75,5.8,-.25,-4.75],
// 4 71 9.6 -.25 5.25 5.8 -.25 -4.75 6.2 -.25 -4.75 9.8 -.25 5.25
  [4,71,9.6,-.25,5.25,5.8,-.25,-4.75,6.2,-.25,-4.75,9.8,-.25,5.25],
// 4 72 12.6 -.25 5.25 9.8 -.25 5.25 6.2 -.25 -4.75 9.2 -.25 -4.75
  [4,72,12.6,-.25,5.25,9.8,-.25,5.25,6.2,-.25,-4.75,9.2,-.25,-4.75],
// 4 72 12.6 -.25 5.25 9.2 -.25 -4.75 12.8956 -.25 -2.2808 14.07824 -.25 3.03768
  [4,72,12.6,-.25,5.25,9.2,-.25,-4.75,12.8956,-.25,-2.2808,14.07824,-.25,3.03768],
];
module ldraw_lib__6177741h(step=0, col=false, unit=2/5, alt=false, line=0.2, solid=!$preview)
    makepoly(ldraw_lib__6177741h(), step=step, col=col, unit=unit, alt=alt, line=line, solid=solid);
ldraw_lib__6177741h(line=0.2);
